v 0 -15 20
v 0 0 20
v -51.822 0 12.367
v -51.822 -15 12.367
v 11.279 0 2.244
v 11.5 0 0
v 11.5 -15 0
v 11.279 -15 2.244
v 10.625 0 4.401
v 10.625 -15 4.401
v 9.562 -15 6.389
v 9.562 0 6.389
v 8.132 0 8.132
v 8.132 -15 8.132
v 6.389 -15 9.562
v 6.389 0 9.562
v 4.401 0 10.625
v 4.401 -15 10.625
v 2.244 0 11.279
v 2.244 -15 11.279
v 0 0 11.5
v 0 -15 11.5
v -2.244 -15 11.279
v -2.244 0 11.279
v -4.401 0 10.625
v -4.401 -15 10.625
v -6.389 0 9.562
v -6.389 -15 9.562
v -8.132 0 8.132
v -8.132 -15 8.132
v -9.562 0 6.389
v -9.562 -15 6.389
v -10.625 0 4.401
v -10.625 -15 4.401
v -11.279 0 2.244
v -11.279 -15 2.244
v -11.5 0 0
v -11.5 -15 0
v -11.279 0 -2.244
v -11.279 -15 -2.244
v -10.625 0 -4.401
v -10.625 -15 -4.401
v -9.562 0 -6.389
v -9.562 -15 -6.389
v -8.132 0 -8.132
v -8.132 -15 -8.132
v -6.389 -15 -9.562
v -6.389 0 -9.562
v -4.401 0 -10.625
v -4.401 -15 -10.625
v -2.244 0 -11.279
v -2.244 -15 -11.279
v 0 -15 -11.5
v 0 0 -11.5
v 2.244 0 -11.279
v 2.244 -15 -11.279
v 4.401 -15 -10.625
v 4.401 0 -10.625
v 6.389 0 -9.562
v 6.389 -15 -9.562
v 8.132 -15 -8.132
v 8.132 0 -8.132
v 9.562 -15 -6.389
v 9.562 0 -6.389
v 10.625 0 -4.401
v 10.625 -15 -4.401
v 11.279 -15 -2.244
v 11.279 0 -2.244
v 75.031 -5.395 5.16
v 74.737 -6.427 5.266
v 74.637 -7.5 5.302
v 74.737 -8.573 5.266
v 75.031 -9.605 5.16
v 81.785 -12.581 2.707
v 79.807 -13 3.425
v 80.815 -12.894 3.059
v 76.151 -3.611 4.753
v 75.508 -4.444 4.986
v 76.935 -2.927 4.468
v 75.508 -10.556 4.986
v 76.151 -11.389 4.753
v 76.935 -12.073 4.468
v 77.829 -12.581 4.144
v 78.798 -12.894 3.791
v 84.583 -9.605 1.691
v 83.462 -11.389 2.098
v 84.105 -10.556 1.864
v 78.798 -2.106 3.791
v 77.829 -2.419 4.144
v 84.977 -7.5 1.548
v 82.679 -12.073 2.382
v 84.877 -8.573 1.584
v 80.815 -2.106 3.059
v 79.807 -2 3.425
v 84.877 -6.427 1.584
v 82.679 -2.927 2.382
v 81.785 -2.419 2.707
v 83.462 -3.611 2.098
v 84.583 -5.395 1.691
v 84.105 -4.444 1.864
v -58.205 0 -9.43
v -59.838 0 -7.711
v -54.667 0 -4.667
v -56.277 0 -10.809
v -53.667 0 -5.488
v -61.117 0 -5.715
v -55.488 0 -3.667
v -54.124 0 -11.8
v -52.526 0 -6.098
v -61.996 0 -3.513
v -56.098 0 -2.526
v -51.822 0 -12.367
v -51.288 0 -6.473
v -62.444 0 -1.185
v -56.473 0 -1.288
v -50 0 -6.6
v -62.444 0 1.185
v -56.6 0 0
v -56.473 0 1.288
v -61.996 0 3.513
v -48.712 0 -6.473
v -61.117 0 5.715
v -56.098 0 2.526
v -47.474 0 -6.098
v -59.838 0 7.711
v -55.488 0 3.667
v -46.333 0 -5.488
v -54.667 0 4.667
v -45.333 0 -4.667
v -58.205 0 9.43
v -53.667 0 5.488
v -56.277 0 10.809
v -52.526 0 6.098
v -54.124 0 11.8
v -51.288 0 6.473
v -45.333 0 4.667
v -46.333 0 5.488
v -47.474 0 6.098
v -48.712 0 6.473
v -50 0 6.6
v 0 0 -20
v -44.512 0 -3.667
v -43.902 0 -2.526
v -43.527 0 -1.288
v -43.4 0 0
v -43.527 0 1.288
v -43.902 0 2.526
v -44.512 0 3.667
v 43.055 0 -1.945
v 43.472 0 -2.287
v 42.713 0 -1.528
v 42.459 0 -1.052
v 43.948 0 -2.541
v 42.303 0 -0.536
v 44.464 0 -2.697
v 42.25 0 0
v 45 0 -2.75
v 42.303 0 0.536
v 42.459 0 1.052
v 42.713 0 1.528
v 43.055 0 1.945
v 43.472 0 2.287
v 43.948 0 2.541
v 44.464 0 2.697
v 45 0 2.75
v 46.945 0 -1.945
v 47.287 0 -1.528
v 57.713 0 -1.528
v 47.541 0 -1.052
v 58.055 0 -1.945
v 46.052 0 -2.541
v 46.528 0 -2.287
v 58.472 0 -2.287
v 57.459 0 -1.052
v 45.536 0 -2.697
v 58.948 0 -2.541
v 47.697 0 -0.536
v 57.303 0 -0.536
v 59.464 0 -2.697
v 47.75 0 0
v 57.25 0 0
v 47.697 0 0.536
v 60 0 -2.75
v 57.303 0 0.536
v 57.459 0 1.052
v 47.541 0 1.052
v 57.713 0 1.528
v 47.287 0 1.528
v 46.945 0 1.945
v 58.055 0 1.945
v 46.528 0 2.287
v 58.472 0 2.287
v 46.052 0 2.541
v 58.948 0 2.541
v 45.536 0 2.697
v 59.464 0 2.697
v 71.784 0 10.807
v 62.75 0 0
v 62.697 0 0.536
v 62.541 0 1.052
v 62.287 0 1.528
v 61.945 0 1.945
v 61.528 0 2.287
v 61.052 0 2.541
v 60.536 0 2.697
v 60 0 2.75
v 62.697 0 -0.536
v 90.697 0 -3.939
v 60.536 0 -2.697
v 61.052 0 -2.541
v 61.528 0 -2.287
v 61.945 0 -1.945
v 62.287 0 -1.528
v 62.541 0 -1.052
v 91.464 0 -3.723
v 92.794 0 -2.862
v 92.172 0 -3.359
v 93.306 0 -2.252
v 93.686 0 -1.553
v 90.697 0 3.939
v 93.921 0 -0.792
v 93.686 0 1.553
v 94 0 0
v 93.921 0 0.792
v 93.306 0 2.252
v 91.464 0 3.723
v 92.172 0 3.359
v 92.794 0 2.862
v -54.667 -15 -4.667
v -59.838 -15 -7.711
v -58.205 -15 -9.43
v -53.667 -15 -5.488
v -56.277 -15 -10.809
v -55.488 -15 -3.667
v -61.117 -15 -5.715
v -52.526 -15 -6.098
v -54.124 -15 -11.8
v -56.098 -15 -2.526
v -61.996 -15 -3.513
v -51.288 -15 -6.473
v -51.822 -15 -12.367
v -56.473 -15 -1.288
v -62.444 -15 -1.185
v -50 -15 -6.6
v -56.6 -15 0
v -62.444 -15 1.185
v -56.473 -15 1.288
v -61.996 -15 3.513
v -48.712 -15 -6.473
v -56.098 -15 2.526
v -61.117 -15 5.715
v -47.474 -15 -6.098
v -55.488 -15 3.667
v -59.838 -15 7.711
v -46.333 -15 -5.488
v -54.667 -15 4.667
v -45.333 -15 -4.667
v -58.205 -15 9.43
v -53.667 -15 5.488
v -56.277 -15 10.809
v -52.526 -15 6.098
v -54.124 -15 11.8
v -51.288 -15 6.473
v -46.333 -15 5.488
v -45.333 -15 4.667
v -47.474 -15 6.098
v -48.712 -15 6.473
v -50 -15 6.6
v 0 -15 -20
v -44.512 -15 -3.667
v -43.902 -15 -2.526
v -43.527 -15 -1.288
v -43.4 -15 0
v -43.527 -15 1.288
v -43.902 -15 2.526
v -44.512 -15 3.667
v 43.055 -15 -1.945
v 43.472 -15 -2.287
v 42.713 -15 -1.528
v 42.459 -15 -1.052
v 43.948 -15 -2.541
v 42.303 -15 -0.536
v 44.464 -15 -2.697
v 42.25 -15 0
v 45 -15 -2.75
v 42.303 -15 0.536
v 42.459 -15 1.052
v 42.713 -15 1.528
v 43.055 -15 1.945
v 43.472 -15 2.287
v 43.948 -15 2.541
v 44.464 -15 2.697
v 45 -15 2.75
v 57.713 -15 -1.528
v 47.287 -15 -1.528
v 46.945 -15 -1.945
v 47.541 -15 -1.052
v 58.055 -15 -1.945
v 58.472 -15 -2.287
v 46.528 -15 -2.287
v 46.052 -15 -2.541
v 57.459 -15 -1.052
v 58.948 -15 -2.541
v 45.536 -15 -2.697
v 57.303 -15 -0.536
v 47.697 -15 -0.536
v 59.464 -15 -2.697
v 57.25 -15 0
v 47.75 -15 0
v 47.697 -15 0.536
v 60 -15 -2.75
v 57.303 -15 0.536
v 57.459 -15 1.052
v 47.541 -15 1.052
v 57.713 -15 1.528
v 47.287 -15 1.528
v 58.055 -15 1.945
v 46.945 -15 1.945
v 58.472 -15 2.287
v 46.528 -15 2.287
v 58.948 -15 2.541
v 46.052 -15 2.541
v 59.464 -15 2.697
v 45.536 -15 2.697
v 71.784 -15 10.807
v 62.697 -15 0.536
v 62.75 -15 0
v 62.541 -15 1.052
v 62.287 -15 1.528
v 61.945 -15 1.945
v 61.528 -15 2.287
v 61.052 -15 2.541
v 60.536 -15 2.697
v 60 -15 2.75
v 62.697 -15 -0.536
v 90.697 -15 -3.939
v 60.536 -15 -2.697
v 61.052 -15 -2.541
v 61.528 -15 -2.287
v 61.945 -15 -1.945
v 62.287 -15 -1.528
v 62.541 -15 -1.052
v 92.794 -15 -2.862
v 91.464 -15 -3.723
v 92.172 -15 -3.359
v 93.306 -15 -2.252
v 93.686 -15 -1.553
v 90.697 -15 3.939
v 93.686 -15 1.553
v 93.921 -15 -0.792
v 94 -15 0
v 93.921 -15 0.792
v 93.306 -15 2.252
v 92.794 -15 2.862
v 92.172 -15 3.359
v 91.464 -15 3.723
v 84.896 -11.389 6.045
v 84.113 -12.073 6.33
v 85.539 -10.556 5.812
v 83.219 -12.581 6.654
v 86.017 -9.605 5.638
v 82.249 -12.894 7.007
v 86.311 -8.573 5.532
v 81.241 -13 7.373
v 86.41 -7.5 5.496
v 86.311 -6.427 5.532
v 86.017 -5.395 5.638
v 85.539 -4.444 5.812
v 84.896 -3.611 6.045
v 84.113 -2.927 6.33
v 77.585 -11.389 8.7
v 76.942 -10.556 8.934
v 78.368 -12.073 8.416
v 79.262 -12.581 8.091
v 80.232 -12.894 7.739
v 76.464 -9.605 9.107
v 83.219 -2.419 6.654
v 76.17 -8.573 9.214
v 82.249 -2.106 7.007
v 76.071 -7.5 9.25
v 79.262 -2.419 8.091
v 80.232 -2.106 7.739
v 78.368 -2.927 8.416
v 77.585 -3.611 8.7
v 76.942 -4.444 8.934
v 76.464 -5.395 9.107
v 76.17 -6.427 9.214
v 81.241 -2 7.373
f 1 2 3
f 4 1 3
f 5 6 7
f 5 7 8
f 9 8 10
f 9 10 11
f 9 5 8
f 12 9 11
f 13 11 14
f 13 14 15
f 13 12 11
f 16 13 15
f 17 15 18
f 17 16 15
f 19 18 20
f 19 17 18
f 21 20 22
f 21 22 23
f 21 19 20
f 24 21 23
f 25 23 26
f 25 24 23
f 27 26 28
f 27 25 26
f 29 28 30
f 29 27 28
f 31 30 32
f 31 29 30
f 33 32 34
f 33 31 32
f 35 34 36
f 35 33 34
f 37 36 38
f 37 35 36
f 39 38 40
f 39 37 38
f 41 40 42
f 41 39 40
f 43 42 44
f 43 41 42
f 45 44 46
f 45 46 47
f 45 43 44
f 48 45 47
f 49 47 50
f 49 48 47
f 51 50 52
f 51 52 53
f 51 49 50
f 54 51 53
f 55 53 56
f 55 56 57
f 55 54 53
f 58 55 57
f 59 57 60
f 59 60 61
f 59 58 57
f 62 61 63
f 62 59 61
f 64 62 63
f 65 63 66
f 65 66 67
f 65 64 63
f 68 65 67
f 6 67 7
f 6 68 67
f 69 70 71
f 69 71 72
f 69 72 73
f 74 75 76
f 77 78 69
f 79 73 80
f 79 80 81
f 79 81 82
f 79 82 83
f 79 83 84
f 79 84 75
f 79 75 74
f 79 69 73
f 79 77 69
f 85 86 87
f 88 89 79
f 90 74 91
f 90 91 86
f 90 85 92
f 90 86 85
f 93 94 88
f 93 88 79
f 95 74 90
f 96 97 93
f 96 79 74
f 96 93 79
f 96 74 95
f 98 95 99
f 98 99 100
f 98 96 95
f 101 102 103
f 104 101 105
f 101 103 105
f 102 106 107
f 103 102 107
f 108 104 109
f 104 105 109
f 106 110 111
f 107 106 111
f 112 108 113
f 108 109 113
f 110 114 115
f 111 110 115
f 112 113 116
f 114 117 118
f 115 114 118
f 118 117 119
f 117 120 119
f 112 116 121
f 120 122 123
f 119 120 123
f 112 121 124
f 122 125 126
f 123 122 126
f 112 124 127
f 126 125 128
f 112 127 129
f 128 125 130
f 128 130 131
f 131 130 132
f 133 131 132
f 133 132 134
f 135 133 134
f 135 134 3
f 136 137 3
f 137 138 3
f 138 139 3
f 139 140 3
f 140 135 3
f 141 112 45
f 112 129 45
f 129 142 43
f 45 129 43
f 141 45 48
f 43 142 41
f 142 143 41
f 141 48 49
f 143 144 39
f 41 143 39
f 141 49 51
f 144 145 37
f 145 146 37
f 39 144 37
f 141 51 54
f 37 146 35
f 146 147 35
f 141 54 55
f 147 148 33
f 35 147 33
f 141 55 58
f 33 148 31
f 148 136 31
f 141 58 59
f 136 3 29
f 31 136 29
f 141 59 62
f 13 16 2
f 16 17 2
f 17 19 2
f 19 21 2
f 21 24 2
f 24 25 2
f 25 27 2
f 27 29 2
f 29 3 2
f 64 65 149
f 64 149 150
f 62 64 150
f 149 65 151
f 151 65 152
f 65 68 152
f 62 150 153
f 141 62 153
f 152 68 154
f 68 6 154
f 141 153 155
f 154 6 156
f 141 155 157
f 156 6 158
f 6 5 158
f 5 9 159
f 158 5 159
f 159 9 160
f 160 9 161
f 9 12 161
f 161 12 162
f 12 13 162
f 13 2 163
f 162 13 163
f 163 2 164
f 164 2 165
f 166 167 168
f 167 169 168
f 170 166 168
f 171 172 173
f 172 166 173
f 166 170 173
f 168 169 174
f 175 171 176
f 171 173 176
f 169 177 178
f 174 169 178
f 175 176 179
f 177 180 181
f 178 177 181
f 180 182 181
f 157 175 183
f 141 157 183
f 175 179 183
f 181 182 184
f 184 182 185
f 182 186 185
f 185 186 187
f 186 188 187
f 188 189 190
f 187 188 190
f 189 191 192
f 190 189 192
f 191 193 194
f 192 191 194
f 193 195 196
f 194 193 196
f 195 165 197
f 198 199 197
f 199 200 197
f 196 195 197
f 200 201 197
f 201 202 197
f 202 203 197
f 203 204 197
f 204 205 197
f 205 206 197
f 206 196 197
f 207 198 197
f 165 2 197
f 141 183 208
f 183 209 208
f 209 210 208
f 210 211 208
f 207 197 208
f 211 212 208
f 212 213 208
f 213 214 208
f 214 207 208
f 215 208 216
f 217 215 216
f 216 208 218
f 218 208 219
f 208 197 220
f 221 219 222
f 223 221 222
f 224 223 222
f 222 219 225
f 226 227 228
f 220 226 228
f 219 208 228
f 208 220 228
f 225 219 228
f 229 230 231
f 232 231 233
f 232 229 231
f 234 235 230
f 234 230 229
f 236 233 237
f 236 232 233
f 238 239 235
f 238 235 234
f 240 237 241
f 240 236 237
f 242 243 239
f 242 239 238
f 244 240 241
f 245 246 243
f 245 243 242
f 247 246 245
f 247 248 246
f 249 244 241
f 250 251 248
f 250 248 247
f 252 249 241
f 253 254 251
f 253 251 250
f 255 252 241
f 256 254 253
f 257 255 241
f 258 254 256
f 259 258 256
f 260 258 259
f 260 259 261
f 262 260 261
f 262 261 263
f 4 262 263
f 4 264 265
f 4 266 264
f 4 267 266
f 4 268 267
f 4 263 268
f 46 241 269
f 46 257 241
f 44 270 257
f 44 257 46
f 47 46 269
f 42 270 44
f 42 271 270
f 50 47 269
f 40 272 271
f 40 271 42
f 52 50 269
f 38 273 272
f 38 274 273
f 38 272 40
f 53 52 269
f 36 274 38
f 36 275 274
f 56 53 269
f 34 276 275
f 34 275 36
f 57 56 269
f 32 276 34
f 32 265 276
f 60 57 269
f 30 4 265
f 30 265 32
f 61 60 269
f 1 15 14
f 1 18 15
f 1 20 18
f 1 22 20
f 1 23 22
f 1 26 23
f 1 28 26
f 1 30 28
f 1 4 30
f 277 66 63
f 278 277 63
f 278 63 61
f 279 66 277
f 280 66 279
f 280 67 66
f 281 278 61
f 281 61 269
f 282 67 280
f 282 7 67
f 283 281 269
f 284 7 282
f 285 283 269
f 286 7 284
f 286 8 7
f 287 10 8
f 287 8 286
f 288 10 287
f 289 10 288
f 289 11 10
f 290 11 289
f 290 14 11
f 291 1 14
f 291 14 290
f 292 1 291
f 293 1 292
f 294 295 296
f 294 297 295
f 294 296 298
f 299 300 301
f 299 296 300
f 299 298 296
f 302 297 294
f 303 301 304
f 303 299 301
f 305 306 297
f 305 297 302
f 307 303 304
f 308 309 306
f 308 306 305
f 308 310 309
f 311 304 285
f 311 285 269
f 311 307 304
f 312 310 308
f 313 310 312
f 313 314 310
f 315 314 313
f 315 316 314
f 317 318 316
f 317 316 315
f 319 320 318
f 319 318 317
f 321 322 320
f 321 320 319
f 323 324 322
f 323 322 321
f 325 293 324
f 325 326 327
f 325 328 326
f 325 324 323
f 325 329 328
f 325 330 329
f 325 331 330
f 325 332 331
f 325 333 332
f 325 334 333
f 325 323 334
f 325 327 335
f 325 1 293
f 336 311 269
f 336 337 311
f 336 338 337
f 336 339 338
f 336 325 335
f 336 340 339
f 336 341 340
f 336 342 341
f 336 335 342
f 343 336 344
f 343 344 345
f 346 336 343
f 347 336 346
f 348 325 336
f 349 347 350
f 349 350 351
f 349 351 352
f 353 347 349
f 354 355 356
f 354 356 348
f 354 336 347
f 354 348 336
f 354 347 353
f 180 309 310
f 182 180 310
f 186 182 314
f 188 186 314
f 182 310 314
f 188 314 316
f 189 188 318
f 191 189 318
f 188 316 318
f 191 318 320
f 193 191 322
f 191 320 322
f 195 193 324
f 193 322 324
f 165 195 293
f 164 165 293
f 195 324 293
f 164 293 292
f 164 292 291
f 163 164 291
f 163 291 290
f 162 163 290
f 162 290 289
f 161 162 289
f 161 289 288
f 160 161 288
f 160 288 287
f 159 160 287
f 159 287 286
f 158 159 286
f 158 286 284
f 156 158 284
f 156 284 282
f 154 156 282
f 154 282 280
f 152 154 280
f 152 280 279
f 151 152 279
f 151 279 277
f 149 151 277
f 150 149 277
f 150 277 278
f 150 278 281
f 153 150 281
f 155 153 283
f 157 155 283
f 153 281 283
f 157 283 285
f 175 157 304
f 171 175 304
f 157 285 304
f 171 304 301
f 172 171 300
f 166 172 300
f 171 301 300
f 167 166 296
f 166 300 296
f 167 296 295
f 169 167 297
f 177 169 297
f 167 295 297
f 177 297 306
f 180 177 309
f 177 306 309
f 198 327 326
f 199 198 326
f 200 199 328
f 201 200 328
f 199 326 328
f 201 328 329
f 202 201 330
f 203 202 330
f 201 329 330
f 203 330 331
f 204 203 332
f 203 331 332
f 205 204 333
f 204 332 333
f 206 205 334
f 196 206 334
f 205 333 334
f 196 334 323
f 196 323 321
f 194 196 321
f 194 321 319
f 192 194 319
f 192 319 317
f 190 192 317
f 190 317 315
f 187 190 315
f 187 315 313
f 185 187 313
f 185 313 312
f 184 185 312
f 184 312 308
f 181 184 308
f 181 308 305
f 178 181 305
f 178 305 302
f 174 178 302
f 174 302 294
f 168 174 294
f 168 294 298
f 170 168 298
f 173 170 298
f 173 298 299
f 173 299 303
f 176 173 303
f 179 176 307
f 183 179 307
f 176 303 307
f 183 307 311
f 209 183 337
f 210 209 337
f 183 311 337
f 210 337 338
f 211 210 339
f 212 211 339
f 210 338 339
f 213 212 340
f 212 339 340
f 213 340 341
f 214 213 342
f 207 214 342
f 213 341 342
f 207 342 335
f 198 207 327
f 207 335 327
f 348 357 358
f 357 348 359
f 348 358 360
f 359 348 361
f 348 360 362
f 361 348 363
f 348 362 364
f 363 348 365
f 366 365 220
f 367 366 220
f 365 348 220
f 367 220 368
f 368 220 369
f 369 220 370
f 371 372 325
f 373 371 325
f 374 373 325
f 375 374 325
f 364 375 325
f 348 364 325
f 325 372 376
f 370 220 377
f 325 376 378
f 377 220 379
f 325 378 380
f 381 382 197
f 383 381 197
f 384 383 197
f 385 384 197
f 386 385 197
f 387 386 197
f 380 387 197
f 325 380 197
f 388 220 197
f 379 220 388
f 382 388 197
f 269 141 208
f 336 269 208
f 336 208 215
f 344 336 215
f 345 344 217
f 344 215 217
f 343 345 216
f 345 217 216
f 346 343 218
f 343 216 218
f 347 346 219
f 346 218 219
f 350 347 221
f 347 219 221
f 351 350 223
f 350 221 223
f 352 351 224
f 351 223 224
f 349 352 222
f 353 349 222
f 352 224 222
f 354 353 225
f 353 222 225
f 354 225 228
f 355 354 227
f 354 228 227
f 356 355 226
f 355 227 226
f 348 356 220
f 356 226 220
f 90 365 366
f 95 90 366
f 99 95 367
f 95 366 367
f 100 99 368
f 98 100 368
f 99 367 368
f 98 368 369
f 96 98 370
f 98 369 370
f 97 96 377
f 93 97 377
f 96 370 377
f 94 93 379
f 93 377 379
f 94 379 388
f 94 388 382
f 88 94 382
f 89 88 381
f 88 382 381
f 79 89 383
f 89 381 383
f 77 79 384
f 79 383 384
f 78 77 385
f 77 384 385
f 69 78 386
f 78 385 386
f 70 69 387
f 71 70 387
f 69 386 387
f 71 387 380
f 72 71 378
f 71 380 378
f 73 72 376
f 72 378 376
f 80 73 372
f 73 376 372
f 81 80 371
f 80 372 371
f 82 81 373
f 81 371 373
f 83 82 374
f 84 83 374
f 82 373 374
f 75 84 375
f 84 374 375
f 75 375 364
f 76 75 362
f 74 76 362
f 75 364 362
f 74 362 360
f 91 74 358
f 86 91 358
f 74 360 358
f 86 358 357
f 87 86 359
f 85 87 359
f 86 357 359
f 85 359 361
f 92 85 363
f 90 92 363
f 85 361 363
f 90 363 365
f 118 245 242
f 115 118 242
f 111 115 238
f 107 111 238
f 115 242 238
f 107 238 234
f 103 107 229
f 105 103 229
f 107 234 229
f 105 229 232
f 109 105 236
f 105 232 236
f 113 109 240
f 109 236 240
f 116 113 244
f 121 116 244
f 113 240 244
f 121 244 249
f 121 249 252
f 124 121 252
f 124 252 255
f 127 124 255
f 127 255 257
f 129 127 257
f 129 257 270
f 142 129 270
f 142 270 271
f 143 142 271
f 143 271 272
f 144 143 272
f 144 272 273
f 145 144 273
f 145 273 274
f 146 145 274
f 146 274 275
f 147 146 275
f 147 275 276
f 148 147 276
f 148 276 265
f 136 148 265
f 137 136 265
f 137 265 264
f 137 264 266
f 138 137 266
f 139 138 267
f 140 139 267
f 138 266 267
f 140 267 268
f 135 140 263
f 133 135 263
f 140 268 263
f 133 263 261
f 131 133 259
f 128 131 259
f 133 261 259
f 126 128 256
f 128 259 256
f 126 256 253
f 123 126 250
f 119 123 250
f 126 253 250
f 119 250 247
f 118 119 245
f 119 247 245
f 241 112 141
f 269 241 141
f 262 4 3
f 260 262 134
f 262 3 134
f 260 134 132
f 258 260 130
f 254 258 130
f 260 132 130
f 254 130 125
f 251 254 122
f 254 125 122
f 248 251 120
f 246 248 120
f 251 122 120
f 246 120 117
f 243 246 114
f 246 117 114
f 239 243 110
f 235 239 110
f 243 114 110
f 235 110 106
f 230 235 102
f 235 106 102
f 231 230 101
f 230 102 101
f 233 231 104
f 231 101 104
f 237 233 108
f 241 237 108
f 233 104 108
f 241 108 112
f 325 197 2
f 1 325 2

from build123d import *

# Parameters (mm, degrees)
F0_R     = 11.5
F1_DEPTH = 15
F3_D     = 5.5
F4_D     = 13.2
F5_R     = 5.5
F6_DEPTH = 4.2


with BuildPart() as f1:
    # F0 (on Front) → F1 (new body)
    with BuildSketch(Plane.XZ):
        with BuildLine():
            Line((71.7835429594, 10.8070662041), (0, 20))
            Line((0, 20), (-51.8216221637, 12.3665554094))
            ThreePointArc((-51.8216221637, 12.3665554094), (-62.5, 0), (-51.8216221637, -12.3665554094))
            Line((-51.8216221637, -12.3665554094), (0, -20))
            Line((0, -20), (90.6974930025, -3.9387185113))
            ThreePointArc((90.6974930025, -3.9387185113), (94, 0), (90.6974930025, 3.9387185113))
            Line((90.6974930025, 3.9387185113), (71.7835429594, 10.8070662041))
        make_face()
        Circle(F0_R, mode=Mode.SUBTRACT)
    extrude(amount=F1_DEPTH)

    # F3 (through all)
    with Locations(Plane(origin=(0, 0, 0), x_dir=(-1, 0, 0), z_dir=(0, 1, 0))):
        with Locations((-60, 0), (-45, 0)):
            Hole(F3_D / 2)

    # F4 (through all)
    with Locations(Plane(origin=(0, 0, 0), x_dir=(1, 0, 0), z_dir=(0, 1, 0))):
        with Locations((-50, 0)):
            Hole(F4_D / 2)

    # F5 (on face) → F6 (cut)
    with BuildSketch(Plane(origin=(11.8303595902, 0, 32.5782619474), x_dir=(0.9399441976, 0, -0.3413281491), z_dir=(0.3413281491, 0, 0.9399441976))):
        with Locations((73.8449777845, -7.5)):
            Circle(F5_R)
    extrude(amount=-F6_DEPTH, mode=Mode.SUBTRACT)


solid = f1.part
